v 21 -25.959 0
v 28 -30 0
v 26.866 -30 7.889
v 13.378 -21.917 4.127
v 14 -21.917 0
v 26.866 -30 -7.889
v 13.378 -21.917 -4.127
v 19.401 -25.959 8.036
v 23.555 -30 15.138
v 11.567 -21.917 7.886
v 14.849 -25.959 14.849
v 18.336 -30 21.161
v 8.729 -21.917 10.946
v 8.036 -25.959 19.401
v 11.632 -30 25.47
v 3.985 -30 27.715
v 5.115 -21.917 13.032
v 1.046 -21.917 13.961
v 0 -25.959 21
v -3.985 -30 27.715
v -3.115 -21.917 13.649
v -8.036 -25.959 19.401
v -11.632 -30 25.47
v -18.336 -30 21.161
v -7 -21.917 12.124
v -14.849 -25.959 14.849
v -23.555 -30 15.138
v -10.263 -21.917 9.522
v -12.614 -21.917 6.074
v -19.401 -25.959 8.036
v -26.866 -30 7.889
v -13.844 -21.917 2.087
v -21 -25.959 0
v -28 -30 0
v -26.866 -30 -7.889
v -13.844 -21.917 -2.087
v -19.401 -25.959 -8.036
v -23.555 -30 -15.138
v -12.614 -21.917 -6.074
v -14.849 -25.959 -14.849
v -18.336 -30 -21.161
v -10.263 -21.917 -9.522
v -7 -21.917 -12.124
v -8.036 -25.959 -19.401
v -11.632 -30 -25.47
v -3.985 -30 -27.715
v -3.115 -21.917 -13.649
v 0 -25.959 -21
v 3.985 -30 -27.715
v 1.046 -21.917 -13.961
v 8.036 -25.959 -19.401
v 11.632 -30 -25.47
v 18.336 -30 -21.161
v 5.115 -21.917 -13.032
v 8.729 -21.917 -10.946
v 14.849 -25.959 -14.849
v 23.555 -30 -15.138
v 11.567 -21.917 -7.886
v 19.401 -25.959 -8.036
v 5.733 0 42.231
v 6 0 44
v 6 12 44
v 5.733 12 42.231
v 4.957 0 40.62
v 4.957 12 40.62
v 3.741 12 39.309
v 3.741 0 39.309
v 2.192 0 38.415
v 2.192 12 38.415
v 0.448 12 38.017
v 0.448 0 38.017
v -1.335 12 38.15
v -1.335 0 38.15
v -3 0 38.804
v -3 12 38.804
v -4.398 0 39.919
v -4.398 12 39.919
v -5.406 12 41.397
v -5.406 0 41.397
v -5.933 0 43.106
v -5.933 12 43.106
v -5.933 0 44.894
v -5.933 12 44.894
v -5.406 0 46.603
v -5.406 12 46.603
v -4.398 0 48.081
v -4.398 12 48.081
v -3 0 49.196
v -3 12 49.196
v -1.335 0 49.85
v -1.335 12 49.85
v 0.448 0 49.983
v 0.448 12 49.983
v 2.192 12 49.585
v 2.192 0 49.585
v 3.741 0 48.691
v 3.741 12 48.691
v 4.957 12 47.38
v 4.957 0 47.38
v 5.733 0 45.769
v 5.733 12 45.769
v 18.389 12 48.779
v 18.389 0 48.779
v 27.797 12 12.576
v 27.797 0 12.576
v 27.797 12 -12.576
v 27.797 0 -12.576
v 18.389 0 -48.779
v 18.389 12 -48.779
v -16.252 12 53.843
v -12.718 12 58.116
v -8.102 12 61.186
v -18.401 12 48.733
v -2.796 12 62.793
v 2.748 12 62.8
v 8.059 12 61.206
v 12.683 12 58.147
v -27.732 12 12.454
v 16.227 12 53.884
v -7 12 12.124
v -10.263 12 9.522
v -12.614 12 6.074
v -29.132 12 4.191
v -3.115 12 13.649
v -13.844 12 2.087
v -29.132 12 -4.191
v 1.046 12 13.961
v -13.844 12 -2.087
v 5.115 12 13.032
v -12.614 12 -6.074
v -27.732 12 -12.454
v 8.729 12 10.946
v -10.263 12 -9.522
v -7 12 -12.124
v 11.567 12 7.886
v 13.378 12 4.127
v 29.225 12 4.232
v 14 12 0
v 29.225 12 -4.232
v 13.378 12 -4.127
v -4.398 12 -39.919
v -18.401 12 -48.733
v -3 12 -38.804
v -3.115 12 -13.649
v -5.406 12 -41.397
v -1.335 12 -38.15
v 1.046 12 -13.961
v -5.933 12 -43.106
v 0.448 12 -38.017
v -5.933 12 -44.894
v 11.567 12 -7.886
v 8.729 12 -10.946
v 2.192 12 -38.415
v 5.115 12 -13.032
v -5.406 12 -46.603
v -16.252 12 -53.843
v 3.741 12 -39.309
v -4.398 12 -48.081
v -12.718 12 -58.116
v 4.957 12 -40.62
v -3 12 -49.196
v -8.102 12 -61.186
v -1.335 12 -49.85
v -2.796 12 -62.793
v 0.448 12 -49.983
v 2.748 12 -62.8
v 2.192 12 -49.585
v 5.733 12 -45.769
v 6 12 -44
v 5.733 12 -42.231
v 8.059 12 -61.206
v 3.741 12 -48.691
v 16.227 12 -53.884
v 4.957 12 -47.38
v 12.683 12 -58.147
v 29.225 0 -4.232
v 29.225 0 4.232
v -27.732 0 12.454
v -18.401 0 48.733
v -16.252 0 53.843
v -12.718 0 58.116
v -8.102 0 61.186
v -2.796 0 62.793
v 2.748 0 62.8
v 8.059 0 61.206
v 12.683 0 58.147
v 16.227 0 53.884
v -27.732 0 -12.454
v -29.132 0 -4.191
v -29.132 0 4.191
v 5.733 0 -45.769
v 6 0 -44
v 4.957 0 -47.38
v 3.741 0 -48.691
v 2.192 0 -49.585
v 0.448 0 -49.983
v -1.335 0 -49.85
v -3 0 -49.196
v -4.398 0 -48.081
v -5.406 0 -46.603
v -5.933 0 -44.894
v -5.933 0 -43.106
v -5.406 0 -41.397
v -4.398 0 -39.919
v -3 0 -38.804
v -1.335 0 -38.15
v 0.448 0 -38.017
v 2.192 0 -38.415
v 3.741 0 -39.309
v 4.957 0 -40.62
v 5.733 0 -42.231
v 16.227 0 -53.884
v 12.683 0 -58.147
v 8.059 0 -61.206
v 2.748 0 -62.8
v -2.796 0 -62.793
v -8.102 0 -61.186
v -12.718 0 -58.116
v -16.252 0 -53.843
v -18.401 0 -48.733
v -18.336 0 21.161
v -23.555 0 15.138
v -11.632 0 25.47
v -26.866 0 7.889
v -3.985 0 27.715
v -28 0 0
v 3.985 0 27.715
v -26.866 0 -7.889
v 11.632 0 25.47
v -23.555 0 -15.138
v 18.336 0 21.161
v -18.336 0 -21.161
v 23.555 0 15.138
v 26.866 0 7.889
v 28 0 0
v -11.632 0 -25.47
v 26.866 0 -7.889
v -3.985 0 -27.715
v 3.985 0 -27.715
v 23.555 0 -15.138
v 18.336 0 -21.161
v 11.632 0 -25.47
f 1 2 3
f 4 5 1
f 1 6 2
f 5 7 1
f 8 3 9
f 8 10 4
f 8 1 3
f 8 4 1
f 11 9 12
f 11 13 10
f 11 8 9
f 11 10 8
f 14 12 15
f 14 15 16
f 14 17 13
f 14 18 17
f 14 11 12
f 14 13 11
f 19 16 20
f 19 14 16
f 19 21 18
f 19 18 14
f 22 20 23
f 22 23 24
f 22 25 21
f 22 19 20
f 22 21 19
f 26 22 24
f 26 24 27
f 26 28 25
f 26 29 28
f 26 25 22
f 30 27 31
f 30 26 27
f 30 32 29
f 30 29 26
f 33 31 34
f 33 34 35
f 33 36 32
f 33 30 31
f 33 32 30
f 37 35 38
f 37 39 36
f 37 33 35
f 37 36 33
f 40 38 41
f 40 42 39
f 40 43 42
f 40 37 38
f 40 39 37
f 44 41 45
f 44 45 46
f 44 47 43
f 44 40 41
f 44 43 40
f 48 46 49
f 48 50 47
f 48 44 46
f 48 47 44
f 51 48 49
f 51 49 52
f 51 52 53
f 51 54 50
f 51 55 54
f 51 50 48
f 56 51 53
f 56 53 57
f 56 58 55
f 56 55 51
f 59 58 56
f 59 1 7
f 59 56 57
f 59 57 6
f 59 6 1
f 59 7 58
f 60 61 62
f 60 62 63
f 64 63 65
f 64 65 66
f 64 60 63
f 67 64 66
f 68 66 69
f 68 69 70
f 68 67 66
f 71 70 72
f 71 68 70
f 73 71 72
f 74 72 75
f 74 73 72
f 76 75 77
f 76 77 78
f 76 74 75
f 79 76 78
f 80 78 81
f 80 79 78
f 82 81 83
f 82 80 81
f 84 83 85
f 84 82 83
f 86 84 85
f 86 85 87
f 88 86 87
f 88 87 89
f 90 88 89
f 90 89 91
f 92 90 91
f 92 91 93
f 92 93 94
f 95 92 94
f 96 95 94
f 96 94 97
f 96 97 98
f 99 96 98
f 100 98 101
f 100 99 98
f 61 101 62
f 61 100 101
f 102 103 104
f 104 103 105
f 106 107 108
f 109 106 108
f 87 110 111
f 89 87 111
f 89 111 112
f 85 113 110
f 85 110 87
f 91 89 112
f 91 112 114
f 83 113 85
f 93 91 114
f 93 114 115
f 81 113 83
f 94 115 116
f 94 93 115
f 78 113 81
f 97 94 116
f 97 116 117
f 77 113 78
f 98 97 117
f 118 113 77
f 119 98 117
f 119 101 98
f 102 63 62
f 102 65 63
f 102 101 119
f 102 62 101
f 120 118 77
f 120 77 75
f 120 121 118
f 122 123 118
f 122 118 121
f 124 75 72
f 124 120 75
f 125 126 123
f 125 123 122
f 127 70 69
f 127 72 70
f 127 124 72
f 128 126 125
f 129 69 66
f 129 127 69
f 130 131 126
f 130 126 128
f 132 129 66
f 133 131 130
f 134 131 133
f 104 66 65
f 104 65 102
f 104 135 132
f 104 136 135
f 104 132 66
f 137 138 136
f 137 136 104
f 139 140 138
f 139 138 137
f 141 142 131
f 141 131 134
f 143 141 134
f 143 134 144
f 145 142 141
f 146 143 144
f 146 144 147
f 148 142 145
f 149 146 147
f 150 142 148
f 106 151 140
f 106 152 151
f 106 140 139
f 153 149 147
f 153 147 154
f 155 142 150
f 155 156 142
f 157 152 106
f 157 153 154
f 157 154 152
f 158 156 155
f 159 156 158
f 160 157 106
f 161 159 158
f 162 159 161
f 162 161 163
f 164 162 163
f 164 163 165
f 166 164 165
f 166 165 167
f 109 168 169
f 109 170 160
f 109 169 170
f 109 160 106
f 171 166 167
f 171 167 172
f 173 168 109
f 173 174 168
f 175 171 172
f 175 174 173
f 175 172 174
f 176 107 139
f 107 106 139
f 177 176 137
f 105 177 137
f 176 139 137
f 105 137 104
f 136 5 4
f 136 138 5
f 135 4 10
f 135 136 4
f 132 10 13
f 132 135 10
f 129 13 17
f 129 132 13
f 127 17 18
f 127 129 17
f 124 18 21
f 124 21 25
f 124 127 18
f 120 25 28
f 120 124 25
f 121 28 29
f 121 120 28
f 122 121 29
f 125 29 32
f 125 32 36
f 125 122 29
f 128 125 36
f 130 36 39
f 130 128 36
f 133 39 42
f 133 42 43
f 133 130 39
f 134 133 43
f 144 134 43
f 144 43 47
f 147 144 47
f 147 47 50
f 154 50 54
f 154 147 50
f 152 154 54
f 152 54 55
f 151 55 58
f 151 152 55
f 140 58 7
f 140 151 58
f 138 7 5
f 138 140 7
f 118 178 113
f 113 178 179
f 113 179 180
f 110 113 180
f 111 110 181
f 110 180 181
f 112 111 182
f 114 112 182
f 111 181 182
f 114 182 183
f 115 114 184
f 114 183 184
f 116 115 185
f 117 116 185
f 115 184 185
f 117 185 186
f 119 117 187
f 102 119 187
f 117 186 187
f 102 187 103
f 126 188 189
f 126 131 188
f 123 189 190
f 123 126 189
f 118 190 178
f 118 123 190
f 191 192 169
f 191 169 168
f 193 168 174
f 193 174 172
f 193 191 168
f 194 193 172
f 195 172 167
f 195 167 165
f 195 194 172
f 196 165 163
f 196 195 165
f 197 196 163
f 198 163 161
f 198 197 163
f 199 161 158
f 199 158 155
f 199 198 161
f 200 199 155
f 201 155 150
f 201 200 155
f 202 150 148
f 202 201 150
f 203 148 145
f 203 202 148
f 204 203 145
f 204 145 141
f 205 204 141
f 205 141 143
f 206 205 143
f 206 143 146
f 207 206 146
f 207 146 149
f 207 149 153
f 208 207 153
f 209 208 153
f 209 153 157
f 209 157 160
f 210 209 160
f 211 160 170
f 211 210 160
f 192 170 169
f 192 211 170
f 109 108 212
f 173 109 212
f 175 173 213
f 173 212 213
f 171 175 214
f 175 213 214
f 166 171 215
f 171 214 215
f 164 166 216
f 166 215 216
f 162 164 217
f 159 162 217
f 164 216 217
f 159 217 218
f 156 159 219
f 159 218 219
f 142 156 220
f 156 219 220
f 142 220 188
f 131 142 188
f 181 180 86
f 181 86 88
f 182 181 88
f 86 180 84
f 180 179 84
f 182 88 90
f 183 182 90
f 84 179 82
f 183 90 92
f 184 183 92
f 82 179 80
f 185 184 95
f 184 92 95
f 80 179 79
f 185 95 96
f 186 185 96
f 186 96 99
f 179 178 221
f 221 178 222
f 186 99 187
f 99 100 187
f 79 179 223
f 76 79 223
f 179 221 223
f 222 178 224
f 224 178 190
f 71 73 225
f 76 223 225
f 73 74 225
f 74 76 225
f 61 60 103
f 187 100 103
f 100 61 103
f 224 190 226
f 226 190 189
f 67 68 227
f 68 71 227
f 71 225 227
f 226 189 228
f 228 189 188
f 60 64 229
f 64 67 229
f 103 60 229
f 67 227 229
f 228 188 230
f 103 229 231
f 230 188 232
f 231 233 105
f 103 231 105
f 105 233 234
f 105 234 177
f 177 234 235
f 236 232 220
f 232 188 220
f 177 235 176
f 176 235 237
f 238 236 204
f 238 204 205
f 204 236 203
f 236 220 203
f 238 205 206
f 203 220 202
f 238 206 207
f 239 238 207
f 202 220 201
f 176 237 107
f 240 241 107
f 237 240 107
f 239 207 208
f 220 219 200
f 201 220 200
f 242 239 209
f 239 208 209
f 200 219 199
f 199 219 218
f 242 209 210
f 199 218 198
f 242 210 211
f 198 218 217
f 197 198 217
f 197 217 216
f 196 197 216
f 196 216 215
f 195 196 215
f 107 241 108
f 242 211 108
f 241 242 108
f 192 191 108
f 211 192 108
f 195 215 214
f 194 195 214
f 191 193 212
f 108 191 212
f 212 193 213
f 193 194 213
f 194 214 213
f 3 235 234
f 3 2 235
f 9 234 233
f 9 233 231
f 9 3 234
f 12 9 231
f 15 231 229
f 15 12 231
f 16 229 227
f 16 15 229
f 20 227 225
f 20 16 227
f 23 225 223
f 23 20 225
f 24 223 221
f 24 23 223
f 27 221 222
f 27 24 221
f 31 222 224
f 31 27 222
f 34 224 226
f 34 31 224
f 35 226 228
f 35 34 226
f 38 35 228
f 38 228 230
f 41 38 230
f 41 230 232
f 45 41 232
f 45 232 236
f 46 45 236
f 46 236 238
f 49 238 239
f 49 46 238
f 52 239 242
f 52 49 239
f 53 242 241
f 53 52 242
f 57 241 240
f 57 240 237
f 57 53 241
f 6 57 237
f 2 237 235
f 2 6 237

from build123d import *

# Parameters (mm, degrees)
SKETCH1_R           = 14
SKETCH1_R_2         = 19
SKETCH1_R_3         = 6
BOSS_EXTRUDE1_DEPTH = 12
FILLET1_R           = 50


with BuildPart() as part:
    # Sketch1 → Boss-Extrude1 (new body)
    with BuildSketch(Plane(origin=(0, 0, 0), x_dir=(1, 0, 0), z_dir=(0, 1, 0))):
        with BuildLine():
            Line((31.065401992, 0), (18.389205605, 48.778819646))
            ThreePointArc((18.389205605, 48.778819646), (18.846682818, 46.408847598), (19, 44))
            ThreePointArc((19, 44), (-2.385148225, 25.15030324), (-18.401165047, 48.732560082))
            Line((-18.401165047, 48.732560082), (-30.934598008, 0))
            Line((-30.934598008, 0), (-18.401165047, -48.732560082))
            ThreePointArc((-18.401165047, -48.732560082), (-2.385148225, -25.15030324), (19, -44))
            ThreePointArc((19, -44), (18.846682818, -46.408847598), (18.389205605, -48.778819646))
            Line((18.389205605, -48.778819646), (31.065401992, 0))
        make_face()
        Circle(SKETCH1_R, mode=Mode.SUBTRACT)
        with Locations((0, -44)):
            Circle(SKETCH1_R_2)
        with Locations((0, -44)):
            Circle(SKETCH1_R_3, mode=Mode.SUBTRACT)
        with Locations((0, 44)):
            Circle(SKETCH1_R_2)
        with Locations((0, 44)):
            Circle(SKETCH1_R_3, mode=Mode.SUBTRACT)
    extrude(amount=BOSS_EXTRUDE1_DEPTH)

    # Fillet1
    fillet1_edges = [part.edges().sort_by_distance(p)[0] for p in [
        (-30.934598008, 6, 0),
        (31.065401992, 6, 0),
    ]]
    fillet(fillet1_edges, radius=FILLET1_R)

    # Sketch3 → Revolve1 (revolve)
    with BuildSketch(Plane.XY):
        Polygon((14, 0), (28, 0), (28, -30), (14, -21.917096231), align=None)
    revolve(axis=Axis((0, 0, 0), (0, -1, 0)))


solid = part.part
